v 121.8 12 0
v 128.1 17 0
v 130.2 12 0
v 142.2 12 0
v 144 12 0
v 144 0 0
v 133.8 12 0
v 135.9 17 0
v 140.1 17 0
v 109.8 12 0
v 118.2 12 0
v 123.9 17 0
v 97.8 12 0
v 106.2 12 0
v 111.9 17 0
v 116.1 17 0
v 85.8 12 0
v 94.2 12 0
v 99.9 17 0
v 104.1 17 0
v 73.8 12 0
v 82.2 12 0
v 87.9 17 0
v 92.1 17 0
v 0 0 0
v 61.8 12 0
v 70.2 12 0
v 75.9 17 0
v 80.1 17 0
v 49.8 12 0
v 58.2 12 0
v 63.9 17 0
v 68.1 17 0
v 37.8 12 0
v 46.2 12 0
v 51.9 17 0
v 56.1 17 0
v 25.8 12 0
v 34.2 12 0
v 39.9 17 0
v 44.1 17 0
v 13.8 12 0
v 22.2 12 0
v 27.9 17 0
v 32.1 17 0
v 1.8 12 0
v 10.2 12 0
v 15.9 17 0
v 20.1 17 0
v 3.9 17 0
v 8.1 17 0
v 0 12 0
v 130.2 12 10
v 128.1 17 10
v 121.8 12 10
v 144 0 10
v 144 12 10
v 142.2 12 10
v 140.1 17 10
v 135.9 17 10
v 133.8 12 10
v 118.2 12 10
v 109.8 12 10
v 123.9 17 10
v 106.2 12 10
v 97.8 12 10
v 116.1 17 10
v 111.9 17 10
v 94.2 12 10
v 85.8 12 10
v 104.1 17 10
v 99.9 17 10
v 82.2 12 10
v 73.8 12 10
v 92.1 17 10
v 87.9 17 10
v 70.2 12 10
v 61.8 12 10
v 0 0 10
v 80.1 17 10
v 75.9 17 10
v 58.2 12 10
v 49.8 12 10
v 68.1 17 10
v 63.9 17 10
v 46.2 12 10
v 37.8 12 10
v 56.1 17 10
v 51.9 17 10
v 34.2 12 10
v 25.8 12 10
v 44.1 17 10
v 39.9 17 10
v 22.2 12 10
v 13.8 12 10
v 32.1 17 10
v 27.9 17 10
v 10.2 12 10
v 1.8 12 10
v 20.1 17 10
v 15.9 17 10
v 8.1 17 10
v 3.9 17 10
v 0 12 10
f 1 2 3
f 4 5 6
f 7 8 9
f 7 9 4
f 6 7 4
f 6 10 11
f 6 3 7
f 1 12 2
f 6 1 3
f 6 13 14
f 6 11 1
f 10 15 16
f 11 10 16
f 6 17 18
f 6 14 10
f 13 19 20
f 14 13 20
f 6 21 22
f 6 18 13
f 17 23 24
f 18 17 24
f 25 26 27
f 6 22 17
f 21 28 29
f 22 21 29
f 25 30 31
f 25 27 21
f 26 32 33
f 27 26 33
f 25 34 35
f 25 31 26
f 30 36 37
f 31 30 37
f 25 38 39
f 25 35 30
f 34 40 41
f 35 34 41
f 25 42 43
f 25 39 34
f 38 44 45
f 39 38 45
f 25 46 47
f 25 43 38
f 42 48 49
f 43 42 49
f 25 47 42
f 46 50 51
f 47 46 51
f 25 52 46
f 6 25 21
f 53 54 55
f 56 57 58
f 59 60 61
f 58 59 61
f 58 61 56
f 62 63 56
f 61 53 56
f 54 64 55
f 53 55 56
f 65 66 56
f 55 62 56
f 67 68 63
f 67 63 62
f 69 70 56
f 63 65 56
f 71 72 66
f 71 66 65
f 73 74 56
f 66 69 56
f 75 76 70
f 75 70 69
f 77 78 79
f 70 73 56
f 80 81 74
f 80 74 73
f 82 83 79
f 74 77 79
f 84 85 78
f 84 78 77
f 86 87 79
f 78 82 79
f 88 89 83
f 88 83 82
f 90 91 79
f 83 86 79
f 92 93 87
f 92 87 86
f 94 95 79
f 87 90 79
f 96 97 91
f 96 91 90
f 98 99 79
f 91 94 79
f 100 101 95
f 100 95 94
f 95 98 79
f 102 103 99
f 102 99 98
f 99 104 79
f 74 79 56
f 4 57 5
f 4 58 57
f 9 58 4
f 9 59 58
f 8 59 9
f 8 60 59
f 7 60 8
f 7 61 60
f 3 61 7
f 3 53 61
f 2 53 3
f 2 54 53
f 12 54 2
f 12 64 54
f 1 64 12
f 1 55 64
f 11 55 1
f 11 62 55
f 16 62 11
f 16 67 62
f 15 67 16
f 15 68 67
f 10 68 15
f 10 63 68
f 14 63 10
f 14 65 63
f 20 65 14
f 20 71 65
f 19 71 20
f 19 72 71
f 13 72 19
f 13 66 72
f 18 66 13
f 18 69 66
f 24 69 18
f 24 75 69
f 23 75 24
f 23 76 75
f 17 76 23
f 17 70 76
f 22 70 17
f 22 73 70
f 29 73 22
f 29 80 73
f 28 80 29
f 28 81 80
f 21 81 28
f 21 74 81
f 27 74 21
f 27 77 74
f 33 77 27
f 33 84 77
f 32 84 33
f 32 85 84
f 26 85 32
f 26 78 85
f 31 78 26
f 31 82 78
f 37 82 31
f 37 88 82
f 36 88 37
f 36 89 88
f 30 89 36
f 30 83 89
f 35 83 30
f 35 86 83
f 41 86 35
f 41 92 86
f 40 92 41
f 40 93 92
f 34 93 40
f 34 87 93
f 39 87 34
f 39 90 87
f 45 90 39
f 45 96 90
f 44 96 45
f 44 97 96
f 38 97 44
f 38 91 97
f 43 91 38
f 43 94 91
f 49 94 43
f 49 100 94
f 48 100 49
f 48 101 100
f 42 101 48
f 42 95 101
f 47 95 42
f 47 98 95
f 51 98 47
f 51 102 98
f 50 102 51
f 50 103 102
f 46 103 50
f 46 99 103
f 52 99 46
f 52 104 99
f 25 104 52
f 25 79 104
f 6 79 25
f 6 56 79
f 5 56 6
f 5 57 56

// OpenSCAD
$fn = 32;

// ----------------------------------------------------------------------
// Gear rack: 12 teeth, pitch 12 mm
// ----------------------------------------------------------------------

// --- parameters (mm) ---
teeth = 12;               // number of teeth
pitch = 12;               // tooth pitch, X
root_w = 8.4;             // tooth width at the root
tip_w = 4.2;              // tooth width at the tip
base_h = 12;              // rack body height, Y
tooth_h = 5;              // tooth height above the body
plate_t = 10;             // rack width, Z (extrusion height)

rack_l = teeth * pitch;  // overall length
total_h = base_h + tooth_h;  // overall height

profile = [[0, 0], [144, 0], [144, 12], [142.2, 12], [140.1, 17], [135.9, 17], [133.8, 12], [130.2, 12], [128.1, 17], [123.9, 17], [121.8, 12], [118.2, 12], [116.1, 17], [111.9, 17], [109.8, 12], [106.2, 12], [104.1, 17], [99.9, 17], [97.8, 12], [94.2, 12], [92.1, 17], [87.9, 17], [85.8, 12], [82.2, 12], [80.1, 17], [75.9, 17], [73.8, 12], [70.2, 12], [68.1, 17], [63.9, 17], [61.8, 12], [58.2, 12], [56.1, 17], [51.9, 17], [49.8, 12], [46.2, 12], [44.1, 17], [39.9, 17], [37.8, 12], [34.2, 12], [32.1, 17], [27.9, 17], [25.8, 12], [22.2, 12], [20.1, 17], [15.9, 17], [13.8, 12], [10.2, 12], [8.1, 17], [3.9, 17], [1.8, 12], [0, 12]];  // primary outline, 52 points, counter clockwise

// --- the one profile operation ---
linear_extrude(height = plate_t) polygon(points = profile);
